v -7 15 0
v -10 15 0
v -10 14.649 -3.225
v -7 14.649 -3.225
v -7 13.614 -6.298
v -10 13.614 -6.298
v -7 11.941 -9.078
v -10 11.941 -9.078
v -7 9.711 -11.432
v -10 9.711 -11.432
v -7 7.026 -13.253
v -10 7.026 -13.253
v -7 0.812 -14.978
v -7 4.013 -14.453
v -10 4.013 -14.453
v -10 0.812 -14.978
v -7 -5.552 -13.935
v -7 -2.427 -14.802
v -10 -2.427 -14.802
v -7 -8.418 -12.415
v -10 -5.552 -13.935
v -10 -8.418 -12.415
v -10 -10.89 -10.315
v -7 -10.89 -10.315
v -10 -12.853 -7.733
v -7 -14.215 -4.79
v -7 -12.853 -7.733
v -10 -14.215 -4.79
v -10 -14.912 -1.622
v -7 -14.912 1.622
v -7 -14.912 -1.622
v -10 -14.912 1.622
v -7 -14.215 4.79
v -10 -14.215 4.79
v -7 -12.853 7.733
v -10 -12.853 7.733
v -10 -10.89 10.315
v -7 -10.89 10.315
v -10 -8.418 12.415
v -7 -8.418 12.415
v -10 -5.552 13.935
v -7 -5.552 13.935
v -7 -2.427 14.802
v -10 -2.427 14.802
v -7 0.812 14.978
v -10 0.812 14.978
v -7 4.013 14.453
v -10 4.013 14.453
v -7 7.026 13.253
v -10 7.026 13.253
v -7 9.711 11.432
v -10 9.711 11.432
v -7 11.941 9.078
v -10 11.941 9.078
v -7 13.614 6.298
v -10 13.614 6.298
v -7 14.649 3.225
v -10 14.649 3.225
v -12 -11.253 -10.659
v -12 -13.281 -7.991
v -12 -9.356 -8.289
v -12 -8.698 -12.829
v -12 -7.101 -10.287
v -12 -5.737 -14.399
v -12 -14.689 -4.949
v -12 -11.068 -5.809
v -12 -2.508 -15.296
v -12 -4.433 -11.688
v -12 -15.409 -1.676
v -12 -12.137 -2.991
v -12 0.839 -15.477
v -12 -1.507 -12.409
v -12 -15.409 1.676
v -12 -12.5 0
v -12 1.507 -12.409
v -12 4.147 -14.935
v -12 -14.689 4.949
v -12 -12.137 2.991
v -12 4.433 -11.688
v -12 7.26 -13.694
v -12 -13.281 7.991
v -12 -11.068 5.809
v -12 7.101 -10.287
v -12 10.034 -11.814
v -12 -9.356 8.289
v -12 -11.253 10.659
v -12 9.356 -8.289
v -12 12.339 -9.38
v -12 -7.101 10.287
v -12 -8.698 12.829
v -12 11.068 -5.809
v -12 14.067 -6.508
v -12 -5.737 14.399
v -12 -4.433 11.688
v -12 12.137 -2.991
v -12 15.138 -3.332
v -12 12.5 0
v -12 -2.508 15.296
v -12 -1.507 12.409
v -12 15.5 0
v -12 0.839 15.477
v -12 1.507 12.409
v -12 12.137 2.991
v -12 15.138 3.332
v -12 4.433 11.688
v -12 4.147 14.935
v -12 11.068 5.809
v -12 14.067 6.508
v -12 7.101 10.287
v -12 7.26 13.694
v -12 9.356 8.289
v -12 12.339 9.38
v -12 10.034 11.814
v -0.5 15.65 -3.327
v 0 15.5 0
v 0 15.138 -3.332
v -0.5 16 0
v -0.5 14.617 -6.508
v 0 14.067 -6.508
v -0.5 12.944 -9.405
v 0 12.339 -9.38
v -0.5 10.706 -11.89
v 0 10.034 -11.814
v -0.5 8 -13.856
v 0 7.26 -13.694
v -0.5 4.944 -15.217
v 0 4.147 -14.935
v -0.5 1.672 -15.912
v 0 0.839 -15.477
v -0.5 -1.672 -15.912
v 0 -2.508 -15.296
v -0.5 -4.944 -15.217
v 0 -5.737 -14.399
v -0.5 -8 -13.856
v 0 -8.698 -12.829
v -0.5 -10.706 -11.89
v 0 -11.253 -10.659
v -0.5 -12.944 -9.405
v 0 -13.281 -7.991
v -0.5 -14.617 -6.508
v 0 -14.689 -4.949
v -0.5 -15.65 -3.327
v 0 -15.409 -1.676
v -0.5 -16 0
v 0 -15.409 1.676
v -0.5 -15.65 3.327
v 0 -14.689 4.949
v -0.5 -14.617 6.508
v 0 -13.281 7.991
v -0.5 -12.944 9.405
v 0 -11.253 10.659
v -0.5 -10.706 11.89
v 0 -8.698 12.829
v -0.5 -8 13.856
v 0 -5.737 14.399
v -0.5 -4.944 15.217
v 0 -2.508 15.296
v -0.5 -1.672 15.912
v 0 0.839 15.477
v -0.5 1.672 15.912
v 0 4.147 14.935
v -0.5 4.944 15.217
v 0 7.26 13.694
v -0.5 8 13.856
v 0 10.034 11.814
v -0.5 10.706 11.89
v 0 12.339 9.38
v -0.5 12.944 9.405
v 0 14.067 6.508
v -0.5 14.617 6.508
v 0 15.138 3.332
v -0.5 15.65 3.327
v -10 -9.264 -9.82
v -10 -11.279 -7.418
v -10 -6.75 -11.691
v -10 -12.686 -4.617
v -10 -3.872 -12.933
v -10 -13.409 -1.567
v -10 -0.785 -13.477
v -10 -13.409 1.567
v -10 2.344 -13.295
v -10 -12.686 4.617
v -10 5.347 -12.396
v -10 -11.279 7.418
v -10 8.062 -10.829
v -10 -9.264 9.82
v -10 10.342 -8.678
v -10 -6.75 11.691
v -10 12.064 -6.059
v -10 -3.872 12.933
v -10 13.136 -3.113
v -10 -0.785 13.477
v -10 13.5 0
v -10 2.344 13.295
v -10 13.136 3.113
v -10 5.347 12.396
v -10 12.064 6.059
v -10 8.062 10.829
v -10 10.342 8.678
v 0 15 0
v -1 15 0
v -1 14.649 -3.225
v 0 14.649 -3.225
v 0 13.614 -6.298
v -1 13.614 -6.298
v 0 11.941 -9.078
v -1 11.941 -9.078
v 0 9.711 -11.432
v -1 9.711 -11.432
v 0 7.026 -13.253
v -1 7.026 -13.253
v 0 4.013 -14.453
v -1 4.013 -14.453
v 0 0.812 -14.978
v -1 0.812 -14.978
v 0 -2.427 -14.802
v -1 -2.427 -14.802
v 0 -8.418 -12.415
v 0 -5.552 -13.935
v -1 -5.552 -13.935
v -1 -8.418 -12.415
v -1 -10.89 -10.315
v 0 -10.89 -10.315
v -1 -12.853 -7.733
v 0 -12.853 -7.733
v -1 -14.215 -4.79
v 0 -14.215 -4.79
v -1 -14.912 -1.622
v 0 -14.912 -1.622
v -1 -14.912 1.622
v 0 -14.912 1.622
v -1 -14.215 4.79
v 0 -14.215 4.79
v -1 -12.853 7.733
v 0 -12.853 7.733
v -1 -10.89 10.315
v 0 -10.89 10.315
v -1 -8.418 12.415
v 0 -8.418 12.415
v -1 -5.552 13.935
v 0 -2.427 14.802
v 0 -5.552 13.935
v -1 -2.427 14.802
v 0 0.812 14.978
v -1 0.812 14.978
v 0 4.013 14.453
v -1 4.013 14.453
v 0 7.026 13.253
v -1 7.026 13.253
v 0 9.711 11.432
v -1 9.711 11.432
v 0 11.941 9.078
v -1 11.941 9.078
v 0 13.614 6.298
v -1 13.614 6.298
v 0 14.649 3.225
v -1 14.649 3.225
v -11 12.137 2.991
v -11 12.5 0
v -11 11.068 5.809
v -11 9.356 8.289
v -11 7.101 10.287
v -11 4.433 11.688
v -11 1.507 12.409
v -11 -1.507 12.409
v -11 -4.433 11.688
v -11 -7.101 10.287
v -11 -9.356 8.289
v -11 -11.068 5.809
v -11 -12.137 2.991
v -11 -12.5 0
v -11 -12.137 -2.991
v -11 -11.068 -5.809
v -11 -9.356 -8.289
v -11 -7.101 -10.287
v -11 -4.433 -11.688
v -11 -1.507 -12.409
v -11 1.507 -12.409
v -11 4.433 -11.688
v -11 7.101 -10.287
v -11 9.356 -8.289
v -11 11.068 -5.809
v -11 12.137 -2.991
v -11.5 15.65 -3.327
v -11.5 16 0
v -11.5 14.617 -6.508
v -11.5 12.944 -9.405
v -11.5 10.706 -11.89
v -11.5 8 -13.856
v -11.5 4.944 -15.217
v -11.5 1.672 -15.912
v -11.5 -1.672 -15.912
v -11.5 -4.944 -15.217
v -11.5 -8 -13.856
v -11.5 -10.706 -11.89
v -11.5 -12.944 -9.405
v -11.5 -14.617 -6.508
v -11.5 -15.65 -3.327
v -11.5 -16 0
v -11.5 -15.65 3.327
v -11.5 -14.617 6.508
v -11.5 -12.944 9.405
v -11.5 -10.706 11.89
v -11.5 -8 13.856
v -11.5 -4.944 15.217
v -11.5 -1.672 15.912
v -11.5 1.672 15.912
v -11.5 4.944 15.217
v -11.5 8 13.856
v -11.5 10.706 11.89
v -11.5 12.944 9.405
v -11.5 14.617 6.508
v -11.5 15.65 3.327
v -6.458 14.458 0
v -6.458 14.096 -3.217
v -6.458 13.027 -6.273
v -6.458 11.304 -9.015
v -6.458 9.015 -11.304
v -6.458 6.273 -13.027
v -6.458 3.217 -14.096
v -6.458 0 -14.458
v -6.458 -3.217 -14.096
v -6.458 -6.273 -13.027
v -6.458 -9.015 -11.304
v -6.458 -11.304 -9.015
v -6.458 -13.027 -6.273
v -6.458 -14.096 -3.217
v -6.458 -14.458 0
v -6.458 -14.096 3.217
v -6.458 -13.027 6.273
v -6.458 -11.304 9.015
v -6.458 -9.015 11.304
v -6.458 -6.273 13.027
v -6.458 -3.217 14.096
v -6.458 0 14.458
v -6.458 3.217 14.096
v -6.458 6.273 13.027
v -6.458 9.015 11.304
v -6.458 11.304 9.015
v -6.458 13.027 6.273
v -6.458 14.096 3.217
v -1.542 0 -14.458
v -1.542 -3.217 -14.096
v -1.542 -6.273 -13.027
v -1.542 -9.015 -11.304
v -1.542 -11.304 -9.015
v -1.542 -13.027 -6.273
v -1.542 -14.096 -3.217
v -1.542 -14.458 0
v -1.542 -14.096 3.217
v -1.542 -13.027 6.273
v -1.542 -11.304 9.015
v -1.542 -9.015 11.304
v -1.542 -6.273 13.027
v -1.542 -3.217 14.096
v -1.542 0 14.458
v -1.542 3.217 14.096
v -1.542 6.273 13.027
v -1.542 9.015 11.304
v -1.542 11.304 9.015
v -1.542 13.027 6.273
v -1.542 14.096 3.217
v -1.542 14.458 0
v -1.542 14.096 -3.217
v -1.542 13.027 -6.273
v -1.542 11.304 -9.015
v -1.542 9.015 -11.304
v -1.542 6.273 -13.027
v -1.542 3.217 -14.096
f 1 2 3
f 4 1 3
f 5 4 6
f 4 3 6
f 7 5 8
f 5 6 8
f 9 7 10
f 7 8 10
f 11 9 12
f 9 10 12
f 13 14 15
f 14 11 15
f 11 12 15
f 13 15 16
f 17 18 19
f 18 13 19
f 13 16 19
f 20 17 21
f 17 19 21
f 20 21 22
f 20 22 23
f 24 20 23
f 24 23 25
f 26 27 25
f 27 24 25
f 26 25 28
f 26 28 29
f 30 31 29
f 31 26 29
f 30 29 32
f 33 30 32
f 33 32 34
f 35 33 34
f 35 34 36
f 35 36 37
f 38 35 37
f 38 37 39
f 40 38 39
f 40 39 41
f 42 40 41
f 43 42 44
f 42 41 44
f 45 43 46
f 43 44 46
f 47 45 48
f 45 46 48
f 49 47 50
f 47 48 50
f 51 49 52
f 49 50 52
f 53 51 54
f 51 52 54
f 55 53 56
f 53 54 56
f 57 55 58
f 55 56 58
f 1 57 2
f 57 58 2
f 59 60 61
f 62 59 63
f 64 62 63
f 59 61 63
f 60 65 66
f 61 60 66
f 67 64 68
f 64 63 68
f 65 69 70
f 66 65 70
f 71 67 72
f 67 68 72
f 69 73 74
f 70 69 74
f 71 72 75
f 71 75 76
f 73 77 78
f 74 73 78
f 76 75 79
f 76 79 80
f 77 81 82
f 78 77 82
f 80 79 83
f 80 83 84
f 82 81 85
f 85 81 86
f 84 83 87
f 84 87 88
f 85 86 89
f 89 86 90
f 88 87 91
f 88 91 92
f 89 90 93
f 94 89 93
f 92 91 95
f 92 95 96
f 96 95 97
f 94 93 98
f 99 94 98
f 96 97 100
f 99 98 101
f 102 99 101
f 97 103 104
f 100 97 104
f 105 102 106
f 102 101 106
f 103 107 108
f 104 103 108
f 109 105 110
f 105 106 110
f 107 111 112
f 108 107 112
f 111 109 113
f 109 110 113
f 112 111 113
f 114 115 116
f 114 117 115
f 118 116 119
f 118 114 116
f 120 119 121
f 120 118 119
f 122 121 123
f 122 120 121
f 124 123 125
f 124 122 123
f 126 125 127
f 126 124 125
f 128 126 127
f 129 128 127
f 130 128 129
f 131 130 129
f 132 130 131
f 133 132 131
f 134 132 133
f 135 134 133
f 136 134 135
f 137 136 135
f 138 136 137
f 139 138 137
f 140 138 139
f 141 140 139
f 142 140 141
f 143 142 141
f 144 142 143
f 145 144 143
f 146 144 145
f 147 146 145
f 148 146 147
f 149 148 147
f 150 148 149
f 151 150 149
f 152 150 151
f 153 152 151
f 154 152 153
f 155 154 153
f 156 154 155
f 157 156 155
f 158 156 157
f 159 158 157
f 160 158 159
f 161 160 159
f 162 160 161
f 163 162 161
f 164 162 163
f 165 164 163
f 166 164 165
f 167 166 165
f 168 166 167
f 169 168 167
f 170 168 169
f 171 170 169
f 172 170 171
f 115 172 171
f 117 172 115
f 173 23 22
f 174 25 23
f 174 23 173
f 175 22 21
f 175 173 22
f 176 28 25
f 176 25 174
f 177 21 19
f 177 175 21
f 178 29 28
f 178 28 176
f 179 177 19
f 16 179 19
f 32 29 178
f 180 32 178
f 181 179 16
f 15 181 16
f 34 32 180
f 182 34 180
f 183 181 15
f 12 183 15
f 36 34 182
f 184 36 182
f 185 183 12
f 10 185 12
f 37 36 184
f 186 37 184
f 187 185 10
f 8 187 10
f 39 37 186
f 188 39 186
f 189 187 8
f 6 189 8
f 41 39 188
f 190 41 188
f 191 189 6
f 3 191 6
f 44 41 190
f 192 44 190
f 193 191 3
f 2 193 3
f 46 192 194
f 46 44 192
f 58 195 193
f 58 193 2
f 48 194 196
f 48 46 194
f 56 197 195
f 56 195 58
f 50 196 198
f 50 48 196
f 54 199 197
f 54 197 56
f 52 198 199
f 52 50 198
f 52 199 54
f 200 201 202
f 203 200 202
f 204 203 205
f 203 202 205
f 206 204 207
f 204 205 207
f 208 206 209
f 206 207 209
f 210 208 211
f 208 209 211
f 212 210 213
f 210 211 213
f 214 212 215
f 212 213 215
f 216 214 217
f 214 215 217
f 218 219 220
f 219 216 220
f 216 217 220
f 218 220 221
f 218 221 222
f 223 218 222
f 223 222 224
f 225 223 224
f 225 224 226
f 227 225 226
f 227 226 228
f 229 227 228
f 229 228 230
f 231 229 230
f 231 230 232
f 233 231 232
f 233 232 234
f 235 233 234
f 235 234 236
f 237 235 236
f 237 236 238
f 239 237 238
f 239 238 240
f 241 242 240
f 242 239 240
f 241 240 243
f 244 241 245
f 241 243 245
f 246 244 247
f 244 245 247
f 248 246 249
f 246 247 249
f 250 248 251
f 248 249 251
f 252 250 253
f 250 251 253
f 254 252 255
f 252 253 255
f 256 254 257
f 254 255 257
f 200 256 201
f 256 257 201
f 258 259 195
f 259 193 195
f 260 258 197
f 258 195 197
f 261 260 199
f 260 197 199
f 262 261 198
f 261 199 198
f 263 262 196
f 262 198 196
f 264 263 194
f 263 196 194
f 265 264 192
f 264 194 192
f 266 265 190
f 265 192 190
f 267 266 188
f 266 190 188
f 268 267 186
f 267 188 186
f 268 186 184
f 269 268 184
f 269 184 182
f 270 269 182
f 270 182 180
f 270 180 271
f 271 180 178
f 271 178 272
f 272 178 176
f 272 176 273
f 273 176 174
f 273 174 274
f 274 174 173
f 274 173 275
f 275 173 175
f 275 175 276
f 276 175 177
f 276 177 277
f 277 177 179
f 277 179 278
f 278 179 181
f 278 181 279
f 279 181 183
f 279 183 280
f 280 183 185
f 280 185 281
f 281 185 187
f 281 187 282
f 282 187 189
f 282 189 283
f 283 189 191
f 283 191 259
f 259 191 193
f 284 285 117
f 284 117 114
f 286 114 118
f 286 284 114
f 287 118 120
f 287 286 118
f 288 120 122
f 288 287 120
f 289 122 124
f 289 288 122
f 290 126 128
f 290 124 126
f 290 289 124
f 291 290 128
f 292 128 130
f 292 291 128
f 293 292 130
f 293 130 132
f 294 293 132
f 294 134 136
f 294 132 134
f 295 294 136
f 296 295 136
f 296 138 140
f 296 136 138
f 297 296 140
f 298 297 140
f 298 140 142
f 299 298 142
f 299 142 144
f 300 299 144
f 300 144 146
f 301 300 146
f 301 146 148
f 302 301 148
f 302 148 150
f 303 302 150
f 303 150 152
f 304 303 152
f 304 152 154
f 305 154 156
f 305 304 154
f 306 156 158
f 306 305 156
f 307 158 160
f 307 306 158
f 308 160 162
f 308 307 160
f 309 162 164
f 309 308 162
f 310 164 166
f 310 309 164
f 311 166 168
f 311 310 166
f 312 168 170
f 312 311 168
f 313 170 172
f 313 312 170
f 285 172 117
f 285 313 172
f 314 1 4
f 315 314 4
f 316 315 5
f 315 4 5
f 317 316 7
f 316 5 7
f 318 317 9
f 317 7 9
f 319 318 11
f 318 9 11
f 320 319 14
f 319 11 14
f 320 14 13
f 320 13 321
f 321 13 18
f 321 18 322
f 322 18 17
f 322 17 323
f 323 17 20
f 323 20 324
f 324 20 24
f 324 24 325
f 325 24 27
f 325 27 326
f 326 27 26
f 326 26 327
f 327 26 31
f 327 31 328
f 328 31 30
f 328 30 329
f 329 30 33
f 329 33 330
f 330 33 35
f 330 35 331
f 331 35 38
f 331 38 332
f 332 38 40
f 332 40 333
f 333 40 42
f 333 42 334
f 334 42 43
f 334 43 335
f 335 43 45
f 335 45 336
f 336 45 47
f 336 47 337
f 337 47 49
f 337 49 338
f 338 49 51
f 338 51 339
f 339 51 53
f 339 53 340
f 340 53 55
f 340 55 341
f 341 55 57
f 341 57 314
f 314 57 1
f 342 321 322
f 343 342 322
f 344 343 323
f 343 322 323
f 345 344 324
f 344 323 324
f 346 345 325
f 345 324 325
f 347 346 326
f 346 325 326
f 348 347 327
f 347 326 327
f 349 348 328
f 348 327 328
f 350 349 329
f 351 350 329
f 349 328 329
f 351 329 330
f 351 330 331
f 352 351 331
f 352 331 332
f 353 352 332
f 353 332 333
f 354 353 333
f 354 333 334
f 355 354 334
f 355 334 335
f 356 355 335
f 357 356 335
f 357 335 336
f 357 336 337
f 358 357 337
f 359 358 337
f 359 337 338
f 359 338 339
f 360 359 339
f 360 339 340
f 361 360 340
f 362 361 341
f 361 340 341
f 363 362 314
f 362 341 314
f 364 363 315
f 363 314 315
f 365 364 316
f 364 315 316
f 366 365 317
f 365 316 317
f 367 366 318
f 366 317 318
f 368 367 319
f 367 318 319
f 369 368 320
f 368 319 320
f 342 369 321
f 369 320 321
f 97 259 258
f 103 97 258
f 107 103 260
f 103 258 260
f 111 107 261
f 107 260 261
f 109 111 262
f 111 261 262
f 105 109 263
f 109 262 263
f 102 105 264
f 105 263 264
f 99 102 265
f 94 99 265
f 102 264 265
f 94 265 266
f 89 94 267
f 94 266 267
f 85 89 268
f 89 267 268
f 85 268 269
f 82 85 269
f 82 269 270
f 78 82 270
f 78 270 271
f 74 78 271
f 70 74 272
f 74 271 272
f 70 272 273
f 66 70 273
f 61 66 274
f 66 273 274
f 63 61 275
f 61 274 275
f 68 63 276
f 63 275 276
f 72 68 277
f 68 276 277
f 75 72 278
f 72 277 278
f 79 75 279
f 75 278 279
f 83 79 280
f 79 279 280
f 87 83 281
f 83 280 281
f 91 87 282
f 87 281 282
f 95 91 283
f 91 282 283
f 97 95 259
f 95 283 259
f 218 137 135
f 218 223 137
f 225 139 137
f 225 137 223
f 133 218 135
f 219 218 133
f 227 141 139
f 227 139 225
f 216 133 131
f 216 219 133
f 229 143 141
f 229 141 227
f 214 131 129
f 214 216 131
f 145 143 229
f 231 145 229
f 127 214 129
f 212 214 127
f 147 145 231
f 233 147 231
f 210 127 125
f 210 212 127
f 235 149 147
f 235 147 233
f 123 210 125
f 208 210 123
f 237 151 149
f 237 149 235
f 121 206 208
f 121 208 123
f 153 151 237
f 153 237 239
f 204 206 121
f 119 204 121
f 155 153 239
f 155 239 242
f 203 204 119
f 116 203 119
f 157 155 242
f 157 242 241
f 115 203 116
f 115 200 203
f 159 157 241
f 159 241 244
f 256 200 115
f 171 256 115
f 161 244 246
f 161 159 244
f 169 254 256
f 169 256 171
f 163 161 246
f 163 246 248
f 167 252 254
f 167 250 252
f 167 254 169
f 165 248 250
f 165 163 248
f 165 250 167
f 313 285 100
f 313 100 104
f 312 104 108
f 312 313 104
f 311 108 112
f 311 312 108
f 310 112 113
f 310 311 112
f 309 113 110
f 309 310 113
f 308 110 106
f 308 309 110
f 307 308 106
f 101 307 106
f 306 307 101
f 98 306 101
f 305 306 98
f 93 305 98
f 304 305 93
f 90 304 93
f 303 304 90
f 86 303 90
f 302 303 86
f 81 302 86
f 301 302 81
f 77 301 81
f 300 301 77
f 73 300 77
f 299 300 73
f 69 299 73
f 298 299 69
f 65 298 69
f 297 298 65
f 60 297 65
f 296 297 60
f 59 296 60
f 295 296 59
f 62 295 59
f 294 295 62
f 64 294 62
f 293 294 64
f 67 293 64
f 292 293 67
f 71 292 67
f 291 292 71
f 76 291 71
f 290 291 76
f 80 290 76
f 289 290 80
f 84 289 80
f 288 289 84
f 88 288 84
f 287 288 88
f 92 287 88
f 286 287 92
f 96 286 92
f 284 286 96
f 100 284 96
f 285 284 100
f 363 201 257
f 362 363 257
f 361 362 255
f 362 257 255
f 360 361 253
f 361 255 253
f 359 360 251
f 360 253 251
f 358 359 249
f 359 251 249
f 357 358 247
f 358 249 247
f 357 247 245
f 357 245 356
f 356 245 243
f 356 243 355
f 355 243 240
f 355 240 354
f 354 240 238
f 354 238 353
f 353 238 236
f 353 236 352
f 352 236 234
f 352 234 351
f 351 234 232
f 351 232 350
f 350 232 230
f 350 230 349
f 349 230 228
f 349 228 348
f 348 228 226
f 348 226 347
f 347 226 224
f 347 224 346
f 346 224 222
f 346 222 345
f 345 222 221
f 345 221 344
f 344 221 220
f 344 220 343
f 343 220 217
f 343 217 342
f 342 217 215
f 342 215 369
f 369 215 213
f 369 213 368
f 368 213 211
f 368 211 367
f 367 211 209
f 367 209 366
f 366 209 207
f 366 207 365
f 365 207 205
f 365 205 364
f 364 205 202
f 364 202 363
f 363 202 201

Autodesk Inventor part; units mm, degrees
ref_plane "YZ Plane" through (0, 0, 0) normal (1, 0, 0) x (0, 1, 0)
ref_plane "XZ Plane" through (0, 0, 0) normal (0, 1, 0) x (-1, 0, 0)
ref_plane "XY Plane" through (0, 0, 0) normal (0, 0, 1) x (1, 0, 0)
sketch "Skizze1" plane through (0, 0, 0) normal (0, 0, 1) x (1, 0, 0)
  line L0 (-14.4, 0) -> (2.4, 0) projected
  line L1 (0, -3.2) -> (0, 19.2) projected
  line L2 (0, 15) -> (-1, 15)
  line L3 (-1, 15) -> (-2, 14)
  line L4 (-2, 14) -> (-6, 14)
  line L5 (-6, 14) -> (-7, 15)
  line L6 (-7, 15) -> (-10, 15)
  line L7 (-10, 15) -> (-10, 13.5)
  line L8 (-0.5, 16) -> (-11.5, 16)
  line L9 (-12, 15.5) -> (-12, 12.5)
  line L10 (-12, 12.5) -> (-11, 12.5)
  line L11 (-11, 12.5) -> (-10, 13.5)
  line L12 (-11.5, 16) -> (-12, 15.5)
  line L13 (0, 15.5) -> (0, 15)
  line L14 (0, 15.5) -> (-0.5, 16)
  point P0 (0, 0)
  point P1 (0, 16)
  point P2 (-12, 16)
  dimension "d0" = 28
  dimension "d1" = 30
  dimension "d2" = 45
  dimension "d3" = 45
  dimension "d4" = 1
  dimension "d5" = 10
  dimension "d6" = 3
  dimension "d7" = 12
  dimension "d9" = 25
  dimension "d10" = 1
  dimension "d11" = 0.5
  dimension "d12" = 0.5
  dimension "d13" = 0.5
  dimension "d14" = 0.5
  dimension "d25" = 27
  dimension "d26" = 1
revolve "Umdrehung1" add sketch "Skizze1" angle 360 about axis through (-10, 0, 0) along (1, 0, 0)
hole "Bohrung1" at (0, 0, 0) direction (-1, 0, 0) diameter 28.917 depth 8 thread size "M30x1" class "6H" standard "ISO Metric profile"
equation "\"d12\" = d11"
equation "\"d14\" = d13"
properties part number "13_0204_036"
